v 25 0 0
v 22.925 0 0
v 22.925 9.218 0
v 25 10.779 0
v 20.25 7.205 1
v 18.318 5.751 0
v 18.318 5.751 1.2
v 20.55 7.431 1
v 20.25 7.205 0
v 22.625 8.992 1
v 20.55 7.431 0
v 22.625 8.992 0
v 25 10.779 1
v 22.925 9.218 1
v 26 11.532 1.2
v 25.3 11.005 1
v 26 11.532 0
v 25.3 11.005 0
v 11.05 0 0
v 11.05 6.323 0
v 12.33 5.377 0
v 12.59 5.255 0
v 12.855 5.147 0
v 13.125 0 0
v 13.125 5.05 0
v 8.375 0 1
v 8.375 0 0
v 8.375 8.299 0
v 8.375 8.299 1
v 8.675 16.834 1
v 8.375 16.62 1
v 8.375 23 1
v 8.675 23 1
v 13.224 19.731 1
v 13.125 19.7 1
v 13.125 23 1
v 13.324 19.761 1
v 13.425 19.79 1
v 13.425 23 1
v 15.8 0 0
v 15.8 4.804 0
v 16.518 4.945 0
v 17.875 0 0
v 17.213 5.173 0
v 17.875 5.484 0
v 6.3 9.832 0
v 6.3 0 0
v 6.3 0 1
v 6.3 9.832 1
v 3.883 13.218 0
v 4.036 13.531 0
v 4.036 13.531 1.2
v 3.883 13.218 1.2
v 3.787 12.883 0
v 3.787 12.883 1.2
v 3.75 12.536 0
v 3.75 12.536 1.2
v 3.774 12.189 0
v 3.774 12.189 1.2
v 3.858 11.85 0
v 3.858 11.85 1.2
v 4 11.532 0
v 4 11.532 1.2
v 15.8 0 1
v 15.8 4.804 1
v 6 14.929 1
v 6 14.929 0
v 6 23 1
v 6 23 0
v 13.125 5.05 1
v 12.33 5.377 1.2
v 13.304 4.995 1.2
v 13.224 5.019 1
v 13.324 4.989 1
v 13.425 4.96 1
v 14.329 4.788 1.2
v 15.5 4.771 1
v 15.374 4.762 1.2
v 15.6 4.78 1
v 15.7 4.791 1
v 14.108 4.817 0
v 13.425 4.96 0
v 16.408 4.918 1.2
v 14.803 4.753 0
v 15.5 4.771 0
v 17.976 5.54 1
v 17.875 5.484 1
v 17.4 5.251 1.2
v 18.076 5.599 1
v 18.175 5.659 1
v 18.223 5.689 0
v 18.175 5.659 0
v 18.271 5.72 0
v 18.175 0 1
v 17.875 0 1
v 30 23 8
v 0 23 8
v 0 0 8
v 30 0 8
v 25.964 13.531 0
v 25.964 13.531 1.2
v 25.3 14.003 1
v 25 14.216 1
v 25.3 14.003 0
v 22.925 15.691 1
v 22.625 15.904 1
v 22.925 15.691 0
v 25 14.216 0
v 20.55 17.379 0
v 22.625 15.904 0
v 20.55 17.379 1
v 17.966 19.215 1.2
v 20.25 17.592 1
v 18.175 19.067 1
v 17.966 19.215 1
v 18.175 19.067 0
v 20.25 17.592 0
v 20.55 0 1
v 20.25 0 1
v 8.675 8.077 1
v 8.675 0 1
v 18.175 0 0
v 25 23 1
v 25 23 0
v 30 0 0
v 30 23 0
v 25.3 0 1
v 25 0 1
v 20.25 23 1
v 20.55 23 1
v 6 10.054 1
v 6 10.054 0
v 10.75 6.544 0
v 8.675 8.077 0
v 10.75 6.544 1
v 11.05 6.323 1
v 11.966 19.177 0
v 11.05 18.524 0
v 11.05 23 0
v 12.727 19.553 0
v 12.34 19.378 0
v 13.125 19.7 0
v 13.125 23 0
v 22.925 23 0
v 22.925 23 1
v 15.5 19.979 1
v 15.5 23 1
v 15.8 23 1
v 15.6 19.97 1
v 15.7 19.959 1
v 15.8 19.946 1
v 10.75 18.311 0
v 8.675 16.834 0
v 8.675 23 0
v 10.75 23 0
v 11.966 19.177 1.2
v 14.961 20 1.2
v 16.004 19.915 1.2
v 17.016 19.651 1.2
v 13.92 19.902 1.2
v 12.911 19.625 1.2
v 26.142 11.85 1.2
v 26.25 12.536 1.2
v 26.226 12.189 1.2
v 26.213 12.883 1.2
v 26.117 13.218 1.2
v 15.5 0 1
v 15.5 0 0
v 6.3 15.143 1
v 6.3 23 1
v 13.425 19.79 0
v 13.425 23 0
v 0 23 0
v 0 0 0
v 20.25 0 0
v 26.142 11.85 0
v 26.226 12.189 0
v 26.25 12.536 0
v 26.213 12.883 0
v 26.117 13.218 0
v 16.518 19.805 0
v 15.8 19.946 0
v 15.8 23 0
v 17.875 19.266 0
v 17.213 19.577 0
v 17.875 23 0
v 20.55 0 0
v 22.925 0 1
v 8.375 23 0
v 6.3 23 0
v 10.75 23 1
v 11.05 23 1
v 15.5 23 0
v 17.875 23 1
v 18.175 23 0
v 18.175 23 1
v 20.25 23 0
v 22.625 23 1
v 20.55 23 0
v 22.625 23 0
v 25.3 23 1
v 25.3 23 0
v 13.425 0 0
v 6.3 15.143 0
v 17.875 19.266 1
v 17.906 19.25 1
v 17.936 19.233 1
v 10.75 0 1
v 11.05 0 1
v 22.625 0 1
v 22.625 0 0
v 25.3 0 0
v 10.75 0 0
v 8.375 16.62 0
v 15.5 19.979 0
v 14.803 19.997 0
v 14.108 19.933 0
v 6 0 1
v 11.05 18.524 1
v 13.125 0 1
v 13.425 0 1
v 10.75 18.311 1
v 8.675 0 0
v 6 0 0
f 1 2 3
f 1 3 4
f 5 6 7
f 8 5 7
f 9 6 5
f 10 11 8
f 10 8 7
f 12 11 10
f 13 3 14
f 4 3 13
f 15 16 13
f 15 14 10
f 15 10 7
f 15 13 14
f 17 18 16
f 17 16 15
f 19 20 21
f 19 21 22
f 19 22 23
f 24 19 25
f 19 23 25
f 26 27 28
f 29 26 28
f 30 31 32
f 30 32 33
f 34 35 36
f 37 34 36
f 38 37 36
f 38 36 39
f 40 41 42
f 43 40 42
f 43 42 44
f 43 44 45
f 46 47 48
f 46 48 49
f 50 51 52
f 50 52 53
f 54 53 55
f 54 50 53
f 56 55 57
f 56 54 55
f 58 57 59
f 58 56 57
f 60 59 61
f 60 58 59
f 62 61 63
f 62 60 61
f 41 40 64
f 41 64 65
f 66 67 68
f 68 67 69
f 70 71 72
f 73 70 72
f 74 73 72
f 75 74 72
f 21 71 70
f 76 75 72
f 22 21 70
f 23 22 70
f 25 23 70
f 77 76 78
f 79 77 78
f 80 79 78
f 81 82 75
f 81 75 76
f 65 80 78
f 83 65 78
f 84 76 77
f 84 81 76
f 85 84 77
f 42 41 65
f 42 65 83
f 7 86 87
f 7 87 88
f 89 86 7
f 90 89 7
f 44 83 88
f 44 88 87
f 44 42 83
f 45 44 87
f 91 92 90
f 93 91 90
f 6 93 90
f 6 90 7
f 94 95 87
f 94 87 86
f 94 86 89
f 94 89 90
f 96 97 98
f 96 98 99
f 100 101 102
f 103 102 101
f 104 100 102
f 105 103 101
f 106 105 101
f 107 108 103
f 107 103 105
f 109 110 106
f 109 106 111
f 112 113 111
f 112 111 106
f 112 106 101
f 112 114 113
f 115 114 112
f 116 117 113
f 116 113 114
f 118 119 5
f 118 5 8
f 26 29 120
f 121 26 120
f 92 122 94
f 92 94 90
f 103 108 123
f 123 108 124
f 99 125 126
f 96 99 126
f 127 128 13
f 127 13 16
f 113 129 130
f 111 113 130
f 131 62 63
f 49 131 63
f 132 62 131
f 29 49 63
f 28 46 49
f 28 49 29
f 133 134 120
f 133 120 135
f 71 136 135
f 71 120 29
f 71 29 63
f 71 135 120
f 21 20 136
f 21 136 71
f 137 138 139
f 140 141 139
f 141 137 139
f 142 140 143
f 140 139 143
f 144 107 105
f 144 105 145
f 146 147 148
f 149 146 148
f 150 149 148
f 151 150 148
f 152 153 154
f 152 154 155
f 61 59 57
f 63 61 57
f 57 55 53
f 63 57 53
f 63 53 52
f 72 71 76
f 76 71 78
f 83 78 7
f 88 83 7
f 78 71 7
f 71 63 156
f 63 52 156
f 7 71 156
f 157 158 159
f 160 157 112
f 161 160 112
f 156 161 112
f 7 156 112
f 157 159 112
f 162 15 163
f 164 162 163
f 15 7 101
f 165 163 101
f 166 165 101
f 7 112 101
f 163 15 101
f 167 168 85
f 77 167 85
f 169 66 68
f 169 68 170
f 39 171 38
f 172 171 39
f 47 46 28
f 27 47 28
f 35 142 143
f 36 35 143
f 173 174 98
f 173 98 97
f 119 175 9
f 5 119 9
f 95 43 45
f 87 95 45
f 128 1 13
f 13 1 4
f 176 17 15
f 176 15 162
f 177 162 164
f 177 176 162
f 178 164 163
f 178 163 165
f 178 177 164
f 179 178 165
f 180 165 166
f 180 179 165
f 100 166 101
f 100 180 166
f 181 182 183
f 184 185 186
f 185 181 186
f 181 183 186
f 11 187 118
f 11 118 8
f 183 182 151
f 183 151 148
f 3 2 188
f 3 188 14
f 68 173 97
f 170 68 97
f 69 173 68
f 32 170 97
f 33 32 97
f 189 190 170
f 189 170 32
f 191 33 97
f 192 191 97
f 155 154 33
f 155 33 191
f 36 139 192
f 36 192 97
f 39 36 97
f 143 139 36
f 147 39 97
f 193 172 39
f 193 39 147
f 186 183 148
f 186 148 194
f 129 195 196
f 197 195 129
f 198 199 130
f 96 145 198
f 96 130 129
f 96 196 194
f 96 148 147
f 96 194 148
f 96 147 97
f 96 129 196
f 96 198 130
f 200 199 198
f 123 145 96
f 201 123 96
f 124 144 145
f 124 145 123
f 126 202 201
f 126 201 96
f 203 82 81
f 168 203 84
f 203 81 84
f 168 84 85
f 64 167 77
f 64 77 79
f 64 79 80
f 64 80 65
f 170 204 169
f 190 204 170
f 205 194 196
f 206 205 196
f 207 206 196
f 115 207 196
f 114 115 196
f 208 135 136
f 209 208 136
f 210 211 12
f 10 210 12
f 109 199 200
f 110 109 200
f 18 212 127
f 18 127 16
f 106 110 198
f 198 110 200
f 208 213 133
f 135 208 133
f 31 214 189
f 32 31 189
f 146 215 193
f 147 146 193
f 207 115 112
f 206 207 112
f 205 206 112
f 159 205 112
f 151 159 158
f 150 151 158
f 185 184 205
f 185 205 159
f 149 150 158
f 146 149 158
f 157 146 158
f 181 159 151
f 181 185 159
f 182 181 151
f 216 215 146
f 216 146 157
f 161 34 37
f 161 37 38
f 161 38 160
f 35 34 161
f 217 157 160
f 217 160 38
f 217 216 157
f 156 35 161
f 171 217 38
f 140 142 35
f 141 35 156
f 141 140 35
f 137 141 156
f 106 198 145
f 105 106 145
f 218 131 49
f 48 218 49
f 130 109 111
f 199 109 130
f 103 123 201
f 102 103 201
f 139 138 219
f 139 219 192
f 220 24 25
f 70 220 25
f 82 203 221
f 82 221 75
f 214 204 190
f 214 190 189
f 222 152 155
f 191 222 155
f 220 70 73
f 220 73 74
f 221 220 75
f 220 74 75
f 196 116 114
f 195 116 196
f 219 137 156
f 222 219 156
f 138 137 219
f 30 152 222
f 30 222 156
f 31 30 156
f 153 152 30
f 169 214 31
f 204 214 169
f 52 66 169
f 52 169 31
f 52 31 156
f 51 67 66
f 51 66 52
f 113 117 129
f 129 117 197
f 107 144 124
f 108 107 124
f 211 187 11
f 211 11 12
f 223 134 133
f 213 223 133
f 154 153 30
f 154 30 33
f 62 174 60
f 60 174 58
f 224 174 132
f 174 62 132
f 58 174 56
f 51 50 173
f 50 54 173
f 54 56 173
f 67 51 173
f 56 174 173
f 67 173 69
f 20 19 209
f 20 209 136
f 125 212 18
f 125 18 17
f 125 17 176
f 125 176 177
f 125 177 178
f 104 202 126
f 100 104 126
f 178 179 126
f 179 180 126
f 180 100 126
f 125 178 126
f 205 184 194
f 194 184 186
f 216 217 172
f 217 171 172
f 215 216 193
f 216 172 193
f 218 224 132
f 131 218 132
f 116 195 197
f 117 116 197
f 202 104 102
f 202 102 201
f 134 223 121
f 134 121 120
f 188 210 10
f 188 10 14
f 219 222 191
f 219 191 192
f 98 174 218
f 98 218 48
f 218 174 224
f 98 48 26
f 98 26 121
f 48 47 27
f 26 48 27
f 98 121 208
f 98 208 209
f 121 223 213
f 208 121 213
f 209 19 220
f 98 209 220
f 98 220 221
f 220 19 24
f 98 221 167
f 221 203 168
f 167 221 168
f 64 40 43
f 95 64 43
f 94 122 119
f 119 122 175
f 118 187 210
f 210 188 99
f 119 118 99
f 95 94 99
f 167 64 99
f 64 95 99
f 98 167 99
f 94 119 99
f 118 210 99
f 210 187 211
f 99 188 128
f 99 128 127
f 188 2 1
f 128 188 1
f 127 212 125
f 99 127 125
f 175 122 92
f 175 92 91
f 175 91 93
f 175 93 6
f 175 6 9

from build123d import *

# Parameters (mm, degrees)
SKETCH_W            = 30
SKETCH_H            = 23
PAD002_DEPTH        = 8
POCKET001_DEPTH     = 1.2
SKETCH002_W         = 0.3
SKETCH002_H         = 23
POCKET_DEPTH        = 1
LINEARPATTERN_COUNT = 9
LINEARPATTERN_PITCH = 2.375


with BuildPart() as part:
    # Sketch → Pad002 (new body)
    with BuildSketch(Plane.XY):
        with Locations((15, 11.5)):
            Rectangle(SKETCH_W, SKETCH_H)
    extrude(amount=PAD002_DEPTH)

    # Sketch001 → Pocket001 (cut)
    with BuildSketch(Plane.XY):
        with BuildLine():
            ThreePointArc((17.966363, 19.215428), (14.961232, 19.999875), (11.966488, 19.17666))
            Line((11.966488, 19.17666), (4.036475, 13.531422))
            ThreePointArc((4.036475, 13.531422), (3.750333, 12.536475), (4, 11.531754))
            Line((4, 11.531754), (12.33, 5.376817))
            ThreePointArc((12.33, 5.376817), (15.374304, 4.761687), (18.318313, 5.75112))
            Line((18.318313, 5.75112), (26, 11.531754))
            ThreePointArc((26, 11.531754), (26.249667, 12.536475), (25.963525, 13.531422))
            Line((25.963525, 13.531422), (17.966363, 19.215428))
        make_face()
    extrude(amount=POCKET001_DEPTH, mode=Mode.SUBTRACT)

    # Sketch002 → Pocket (cut)
    with BuildSketch(Plane.XY):
        with Locations((6.15, 11.5)):
            Rectangle(SKETCH002_W, SKETCH002_H)
    pocket = extrude(amount=POCKET_DEPTH, mode=Mode.SUBTRACT)

    # LinearPattern: Pocket ×9
    with Locations(*[(i * LINEARPATTERN_PITCH, 0, 0) for i in range(1, LINEARPATTERN_COUNT)]):
        add(pocket, mode=Mode.SUBTRACT)


solid = part.part
